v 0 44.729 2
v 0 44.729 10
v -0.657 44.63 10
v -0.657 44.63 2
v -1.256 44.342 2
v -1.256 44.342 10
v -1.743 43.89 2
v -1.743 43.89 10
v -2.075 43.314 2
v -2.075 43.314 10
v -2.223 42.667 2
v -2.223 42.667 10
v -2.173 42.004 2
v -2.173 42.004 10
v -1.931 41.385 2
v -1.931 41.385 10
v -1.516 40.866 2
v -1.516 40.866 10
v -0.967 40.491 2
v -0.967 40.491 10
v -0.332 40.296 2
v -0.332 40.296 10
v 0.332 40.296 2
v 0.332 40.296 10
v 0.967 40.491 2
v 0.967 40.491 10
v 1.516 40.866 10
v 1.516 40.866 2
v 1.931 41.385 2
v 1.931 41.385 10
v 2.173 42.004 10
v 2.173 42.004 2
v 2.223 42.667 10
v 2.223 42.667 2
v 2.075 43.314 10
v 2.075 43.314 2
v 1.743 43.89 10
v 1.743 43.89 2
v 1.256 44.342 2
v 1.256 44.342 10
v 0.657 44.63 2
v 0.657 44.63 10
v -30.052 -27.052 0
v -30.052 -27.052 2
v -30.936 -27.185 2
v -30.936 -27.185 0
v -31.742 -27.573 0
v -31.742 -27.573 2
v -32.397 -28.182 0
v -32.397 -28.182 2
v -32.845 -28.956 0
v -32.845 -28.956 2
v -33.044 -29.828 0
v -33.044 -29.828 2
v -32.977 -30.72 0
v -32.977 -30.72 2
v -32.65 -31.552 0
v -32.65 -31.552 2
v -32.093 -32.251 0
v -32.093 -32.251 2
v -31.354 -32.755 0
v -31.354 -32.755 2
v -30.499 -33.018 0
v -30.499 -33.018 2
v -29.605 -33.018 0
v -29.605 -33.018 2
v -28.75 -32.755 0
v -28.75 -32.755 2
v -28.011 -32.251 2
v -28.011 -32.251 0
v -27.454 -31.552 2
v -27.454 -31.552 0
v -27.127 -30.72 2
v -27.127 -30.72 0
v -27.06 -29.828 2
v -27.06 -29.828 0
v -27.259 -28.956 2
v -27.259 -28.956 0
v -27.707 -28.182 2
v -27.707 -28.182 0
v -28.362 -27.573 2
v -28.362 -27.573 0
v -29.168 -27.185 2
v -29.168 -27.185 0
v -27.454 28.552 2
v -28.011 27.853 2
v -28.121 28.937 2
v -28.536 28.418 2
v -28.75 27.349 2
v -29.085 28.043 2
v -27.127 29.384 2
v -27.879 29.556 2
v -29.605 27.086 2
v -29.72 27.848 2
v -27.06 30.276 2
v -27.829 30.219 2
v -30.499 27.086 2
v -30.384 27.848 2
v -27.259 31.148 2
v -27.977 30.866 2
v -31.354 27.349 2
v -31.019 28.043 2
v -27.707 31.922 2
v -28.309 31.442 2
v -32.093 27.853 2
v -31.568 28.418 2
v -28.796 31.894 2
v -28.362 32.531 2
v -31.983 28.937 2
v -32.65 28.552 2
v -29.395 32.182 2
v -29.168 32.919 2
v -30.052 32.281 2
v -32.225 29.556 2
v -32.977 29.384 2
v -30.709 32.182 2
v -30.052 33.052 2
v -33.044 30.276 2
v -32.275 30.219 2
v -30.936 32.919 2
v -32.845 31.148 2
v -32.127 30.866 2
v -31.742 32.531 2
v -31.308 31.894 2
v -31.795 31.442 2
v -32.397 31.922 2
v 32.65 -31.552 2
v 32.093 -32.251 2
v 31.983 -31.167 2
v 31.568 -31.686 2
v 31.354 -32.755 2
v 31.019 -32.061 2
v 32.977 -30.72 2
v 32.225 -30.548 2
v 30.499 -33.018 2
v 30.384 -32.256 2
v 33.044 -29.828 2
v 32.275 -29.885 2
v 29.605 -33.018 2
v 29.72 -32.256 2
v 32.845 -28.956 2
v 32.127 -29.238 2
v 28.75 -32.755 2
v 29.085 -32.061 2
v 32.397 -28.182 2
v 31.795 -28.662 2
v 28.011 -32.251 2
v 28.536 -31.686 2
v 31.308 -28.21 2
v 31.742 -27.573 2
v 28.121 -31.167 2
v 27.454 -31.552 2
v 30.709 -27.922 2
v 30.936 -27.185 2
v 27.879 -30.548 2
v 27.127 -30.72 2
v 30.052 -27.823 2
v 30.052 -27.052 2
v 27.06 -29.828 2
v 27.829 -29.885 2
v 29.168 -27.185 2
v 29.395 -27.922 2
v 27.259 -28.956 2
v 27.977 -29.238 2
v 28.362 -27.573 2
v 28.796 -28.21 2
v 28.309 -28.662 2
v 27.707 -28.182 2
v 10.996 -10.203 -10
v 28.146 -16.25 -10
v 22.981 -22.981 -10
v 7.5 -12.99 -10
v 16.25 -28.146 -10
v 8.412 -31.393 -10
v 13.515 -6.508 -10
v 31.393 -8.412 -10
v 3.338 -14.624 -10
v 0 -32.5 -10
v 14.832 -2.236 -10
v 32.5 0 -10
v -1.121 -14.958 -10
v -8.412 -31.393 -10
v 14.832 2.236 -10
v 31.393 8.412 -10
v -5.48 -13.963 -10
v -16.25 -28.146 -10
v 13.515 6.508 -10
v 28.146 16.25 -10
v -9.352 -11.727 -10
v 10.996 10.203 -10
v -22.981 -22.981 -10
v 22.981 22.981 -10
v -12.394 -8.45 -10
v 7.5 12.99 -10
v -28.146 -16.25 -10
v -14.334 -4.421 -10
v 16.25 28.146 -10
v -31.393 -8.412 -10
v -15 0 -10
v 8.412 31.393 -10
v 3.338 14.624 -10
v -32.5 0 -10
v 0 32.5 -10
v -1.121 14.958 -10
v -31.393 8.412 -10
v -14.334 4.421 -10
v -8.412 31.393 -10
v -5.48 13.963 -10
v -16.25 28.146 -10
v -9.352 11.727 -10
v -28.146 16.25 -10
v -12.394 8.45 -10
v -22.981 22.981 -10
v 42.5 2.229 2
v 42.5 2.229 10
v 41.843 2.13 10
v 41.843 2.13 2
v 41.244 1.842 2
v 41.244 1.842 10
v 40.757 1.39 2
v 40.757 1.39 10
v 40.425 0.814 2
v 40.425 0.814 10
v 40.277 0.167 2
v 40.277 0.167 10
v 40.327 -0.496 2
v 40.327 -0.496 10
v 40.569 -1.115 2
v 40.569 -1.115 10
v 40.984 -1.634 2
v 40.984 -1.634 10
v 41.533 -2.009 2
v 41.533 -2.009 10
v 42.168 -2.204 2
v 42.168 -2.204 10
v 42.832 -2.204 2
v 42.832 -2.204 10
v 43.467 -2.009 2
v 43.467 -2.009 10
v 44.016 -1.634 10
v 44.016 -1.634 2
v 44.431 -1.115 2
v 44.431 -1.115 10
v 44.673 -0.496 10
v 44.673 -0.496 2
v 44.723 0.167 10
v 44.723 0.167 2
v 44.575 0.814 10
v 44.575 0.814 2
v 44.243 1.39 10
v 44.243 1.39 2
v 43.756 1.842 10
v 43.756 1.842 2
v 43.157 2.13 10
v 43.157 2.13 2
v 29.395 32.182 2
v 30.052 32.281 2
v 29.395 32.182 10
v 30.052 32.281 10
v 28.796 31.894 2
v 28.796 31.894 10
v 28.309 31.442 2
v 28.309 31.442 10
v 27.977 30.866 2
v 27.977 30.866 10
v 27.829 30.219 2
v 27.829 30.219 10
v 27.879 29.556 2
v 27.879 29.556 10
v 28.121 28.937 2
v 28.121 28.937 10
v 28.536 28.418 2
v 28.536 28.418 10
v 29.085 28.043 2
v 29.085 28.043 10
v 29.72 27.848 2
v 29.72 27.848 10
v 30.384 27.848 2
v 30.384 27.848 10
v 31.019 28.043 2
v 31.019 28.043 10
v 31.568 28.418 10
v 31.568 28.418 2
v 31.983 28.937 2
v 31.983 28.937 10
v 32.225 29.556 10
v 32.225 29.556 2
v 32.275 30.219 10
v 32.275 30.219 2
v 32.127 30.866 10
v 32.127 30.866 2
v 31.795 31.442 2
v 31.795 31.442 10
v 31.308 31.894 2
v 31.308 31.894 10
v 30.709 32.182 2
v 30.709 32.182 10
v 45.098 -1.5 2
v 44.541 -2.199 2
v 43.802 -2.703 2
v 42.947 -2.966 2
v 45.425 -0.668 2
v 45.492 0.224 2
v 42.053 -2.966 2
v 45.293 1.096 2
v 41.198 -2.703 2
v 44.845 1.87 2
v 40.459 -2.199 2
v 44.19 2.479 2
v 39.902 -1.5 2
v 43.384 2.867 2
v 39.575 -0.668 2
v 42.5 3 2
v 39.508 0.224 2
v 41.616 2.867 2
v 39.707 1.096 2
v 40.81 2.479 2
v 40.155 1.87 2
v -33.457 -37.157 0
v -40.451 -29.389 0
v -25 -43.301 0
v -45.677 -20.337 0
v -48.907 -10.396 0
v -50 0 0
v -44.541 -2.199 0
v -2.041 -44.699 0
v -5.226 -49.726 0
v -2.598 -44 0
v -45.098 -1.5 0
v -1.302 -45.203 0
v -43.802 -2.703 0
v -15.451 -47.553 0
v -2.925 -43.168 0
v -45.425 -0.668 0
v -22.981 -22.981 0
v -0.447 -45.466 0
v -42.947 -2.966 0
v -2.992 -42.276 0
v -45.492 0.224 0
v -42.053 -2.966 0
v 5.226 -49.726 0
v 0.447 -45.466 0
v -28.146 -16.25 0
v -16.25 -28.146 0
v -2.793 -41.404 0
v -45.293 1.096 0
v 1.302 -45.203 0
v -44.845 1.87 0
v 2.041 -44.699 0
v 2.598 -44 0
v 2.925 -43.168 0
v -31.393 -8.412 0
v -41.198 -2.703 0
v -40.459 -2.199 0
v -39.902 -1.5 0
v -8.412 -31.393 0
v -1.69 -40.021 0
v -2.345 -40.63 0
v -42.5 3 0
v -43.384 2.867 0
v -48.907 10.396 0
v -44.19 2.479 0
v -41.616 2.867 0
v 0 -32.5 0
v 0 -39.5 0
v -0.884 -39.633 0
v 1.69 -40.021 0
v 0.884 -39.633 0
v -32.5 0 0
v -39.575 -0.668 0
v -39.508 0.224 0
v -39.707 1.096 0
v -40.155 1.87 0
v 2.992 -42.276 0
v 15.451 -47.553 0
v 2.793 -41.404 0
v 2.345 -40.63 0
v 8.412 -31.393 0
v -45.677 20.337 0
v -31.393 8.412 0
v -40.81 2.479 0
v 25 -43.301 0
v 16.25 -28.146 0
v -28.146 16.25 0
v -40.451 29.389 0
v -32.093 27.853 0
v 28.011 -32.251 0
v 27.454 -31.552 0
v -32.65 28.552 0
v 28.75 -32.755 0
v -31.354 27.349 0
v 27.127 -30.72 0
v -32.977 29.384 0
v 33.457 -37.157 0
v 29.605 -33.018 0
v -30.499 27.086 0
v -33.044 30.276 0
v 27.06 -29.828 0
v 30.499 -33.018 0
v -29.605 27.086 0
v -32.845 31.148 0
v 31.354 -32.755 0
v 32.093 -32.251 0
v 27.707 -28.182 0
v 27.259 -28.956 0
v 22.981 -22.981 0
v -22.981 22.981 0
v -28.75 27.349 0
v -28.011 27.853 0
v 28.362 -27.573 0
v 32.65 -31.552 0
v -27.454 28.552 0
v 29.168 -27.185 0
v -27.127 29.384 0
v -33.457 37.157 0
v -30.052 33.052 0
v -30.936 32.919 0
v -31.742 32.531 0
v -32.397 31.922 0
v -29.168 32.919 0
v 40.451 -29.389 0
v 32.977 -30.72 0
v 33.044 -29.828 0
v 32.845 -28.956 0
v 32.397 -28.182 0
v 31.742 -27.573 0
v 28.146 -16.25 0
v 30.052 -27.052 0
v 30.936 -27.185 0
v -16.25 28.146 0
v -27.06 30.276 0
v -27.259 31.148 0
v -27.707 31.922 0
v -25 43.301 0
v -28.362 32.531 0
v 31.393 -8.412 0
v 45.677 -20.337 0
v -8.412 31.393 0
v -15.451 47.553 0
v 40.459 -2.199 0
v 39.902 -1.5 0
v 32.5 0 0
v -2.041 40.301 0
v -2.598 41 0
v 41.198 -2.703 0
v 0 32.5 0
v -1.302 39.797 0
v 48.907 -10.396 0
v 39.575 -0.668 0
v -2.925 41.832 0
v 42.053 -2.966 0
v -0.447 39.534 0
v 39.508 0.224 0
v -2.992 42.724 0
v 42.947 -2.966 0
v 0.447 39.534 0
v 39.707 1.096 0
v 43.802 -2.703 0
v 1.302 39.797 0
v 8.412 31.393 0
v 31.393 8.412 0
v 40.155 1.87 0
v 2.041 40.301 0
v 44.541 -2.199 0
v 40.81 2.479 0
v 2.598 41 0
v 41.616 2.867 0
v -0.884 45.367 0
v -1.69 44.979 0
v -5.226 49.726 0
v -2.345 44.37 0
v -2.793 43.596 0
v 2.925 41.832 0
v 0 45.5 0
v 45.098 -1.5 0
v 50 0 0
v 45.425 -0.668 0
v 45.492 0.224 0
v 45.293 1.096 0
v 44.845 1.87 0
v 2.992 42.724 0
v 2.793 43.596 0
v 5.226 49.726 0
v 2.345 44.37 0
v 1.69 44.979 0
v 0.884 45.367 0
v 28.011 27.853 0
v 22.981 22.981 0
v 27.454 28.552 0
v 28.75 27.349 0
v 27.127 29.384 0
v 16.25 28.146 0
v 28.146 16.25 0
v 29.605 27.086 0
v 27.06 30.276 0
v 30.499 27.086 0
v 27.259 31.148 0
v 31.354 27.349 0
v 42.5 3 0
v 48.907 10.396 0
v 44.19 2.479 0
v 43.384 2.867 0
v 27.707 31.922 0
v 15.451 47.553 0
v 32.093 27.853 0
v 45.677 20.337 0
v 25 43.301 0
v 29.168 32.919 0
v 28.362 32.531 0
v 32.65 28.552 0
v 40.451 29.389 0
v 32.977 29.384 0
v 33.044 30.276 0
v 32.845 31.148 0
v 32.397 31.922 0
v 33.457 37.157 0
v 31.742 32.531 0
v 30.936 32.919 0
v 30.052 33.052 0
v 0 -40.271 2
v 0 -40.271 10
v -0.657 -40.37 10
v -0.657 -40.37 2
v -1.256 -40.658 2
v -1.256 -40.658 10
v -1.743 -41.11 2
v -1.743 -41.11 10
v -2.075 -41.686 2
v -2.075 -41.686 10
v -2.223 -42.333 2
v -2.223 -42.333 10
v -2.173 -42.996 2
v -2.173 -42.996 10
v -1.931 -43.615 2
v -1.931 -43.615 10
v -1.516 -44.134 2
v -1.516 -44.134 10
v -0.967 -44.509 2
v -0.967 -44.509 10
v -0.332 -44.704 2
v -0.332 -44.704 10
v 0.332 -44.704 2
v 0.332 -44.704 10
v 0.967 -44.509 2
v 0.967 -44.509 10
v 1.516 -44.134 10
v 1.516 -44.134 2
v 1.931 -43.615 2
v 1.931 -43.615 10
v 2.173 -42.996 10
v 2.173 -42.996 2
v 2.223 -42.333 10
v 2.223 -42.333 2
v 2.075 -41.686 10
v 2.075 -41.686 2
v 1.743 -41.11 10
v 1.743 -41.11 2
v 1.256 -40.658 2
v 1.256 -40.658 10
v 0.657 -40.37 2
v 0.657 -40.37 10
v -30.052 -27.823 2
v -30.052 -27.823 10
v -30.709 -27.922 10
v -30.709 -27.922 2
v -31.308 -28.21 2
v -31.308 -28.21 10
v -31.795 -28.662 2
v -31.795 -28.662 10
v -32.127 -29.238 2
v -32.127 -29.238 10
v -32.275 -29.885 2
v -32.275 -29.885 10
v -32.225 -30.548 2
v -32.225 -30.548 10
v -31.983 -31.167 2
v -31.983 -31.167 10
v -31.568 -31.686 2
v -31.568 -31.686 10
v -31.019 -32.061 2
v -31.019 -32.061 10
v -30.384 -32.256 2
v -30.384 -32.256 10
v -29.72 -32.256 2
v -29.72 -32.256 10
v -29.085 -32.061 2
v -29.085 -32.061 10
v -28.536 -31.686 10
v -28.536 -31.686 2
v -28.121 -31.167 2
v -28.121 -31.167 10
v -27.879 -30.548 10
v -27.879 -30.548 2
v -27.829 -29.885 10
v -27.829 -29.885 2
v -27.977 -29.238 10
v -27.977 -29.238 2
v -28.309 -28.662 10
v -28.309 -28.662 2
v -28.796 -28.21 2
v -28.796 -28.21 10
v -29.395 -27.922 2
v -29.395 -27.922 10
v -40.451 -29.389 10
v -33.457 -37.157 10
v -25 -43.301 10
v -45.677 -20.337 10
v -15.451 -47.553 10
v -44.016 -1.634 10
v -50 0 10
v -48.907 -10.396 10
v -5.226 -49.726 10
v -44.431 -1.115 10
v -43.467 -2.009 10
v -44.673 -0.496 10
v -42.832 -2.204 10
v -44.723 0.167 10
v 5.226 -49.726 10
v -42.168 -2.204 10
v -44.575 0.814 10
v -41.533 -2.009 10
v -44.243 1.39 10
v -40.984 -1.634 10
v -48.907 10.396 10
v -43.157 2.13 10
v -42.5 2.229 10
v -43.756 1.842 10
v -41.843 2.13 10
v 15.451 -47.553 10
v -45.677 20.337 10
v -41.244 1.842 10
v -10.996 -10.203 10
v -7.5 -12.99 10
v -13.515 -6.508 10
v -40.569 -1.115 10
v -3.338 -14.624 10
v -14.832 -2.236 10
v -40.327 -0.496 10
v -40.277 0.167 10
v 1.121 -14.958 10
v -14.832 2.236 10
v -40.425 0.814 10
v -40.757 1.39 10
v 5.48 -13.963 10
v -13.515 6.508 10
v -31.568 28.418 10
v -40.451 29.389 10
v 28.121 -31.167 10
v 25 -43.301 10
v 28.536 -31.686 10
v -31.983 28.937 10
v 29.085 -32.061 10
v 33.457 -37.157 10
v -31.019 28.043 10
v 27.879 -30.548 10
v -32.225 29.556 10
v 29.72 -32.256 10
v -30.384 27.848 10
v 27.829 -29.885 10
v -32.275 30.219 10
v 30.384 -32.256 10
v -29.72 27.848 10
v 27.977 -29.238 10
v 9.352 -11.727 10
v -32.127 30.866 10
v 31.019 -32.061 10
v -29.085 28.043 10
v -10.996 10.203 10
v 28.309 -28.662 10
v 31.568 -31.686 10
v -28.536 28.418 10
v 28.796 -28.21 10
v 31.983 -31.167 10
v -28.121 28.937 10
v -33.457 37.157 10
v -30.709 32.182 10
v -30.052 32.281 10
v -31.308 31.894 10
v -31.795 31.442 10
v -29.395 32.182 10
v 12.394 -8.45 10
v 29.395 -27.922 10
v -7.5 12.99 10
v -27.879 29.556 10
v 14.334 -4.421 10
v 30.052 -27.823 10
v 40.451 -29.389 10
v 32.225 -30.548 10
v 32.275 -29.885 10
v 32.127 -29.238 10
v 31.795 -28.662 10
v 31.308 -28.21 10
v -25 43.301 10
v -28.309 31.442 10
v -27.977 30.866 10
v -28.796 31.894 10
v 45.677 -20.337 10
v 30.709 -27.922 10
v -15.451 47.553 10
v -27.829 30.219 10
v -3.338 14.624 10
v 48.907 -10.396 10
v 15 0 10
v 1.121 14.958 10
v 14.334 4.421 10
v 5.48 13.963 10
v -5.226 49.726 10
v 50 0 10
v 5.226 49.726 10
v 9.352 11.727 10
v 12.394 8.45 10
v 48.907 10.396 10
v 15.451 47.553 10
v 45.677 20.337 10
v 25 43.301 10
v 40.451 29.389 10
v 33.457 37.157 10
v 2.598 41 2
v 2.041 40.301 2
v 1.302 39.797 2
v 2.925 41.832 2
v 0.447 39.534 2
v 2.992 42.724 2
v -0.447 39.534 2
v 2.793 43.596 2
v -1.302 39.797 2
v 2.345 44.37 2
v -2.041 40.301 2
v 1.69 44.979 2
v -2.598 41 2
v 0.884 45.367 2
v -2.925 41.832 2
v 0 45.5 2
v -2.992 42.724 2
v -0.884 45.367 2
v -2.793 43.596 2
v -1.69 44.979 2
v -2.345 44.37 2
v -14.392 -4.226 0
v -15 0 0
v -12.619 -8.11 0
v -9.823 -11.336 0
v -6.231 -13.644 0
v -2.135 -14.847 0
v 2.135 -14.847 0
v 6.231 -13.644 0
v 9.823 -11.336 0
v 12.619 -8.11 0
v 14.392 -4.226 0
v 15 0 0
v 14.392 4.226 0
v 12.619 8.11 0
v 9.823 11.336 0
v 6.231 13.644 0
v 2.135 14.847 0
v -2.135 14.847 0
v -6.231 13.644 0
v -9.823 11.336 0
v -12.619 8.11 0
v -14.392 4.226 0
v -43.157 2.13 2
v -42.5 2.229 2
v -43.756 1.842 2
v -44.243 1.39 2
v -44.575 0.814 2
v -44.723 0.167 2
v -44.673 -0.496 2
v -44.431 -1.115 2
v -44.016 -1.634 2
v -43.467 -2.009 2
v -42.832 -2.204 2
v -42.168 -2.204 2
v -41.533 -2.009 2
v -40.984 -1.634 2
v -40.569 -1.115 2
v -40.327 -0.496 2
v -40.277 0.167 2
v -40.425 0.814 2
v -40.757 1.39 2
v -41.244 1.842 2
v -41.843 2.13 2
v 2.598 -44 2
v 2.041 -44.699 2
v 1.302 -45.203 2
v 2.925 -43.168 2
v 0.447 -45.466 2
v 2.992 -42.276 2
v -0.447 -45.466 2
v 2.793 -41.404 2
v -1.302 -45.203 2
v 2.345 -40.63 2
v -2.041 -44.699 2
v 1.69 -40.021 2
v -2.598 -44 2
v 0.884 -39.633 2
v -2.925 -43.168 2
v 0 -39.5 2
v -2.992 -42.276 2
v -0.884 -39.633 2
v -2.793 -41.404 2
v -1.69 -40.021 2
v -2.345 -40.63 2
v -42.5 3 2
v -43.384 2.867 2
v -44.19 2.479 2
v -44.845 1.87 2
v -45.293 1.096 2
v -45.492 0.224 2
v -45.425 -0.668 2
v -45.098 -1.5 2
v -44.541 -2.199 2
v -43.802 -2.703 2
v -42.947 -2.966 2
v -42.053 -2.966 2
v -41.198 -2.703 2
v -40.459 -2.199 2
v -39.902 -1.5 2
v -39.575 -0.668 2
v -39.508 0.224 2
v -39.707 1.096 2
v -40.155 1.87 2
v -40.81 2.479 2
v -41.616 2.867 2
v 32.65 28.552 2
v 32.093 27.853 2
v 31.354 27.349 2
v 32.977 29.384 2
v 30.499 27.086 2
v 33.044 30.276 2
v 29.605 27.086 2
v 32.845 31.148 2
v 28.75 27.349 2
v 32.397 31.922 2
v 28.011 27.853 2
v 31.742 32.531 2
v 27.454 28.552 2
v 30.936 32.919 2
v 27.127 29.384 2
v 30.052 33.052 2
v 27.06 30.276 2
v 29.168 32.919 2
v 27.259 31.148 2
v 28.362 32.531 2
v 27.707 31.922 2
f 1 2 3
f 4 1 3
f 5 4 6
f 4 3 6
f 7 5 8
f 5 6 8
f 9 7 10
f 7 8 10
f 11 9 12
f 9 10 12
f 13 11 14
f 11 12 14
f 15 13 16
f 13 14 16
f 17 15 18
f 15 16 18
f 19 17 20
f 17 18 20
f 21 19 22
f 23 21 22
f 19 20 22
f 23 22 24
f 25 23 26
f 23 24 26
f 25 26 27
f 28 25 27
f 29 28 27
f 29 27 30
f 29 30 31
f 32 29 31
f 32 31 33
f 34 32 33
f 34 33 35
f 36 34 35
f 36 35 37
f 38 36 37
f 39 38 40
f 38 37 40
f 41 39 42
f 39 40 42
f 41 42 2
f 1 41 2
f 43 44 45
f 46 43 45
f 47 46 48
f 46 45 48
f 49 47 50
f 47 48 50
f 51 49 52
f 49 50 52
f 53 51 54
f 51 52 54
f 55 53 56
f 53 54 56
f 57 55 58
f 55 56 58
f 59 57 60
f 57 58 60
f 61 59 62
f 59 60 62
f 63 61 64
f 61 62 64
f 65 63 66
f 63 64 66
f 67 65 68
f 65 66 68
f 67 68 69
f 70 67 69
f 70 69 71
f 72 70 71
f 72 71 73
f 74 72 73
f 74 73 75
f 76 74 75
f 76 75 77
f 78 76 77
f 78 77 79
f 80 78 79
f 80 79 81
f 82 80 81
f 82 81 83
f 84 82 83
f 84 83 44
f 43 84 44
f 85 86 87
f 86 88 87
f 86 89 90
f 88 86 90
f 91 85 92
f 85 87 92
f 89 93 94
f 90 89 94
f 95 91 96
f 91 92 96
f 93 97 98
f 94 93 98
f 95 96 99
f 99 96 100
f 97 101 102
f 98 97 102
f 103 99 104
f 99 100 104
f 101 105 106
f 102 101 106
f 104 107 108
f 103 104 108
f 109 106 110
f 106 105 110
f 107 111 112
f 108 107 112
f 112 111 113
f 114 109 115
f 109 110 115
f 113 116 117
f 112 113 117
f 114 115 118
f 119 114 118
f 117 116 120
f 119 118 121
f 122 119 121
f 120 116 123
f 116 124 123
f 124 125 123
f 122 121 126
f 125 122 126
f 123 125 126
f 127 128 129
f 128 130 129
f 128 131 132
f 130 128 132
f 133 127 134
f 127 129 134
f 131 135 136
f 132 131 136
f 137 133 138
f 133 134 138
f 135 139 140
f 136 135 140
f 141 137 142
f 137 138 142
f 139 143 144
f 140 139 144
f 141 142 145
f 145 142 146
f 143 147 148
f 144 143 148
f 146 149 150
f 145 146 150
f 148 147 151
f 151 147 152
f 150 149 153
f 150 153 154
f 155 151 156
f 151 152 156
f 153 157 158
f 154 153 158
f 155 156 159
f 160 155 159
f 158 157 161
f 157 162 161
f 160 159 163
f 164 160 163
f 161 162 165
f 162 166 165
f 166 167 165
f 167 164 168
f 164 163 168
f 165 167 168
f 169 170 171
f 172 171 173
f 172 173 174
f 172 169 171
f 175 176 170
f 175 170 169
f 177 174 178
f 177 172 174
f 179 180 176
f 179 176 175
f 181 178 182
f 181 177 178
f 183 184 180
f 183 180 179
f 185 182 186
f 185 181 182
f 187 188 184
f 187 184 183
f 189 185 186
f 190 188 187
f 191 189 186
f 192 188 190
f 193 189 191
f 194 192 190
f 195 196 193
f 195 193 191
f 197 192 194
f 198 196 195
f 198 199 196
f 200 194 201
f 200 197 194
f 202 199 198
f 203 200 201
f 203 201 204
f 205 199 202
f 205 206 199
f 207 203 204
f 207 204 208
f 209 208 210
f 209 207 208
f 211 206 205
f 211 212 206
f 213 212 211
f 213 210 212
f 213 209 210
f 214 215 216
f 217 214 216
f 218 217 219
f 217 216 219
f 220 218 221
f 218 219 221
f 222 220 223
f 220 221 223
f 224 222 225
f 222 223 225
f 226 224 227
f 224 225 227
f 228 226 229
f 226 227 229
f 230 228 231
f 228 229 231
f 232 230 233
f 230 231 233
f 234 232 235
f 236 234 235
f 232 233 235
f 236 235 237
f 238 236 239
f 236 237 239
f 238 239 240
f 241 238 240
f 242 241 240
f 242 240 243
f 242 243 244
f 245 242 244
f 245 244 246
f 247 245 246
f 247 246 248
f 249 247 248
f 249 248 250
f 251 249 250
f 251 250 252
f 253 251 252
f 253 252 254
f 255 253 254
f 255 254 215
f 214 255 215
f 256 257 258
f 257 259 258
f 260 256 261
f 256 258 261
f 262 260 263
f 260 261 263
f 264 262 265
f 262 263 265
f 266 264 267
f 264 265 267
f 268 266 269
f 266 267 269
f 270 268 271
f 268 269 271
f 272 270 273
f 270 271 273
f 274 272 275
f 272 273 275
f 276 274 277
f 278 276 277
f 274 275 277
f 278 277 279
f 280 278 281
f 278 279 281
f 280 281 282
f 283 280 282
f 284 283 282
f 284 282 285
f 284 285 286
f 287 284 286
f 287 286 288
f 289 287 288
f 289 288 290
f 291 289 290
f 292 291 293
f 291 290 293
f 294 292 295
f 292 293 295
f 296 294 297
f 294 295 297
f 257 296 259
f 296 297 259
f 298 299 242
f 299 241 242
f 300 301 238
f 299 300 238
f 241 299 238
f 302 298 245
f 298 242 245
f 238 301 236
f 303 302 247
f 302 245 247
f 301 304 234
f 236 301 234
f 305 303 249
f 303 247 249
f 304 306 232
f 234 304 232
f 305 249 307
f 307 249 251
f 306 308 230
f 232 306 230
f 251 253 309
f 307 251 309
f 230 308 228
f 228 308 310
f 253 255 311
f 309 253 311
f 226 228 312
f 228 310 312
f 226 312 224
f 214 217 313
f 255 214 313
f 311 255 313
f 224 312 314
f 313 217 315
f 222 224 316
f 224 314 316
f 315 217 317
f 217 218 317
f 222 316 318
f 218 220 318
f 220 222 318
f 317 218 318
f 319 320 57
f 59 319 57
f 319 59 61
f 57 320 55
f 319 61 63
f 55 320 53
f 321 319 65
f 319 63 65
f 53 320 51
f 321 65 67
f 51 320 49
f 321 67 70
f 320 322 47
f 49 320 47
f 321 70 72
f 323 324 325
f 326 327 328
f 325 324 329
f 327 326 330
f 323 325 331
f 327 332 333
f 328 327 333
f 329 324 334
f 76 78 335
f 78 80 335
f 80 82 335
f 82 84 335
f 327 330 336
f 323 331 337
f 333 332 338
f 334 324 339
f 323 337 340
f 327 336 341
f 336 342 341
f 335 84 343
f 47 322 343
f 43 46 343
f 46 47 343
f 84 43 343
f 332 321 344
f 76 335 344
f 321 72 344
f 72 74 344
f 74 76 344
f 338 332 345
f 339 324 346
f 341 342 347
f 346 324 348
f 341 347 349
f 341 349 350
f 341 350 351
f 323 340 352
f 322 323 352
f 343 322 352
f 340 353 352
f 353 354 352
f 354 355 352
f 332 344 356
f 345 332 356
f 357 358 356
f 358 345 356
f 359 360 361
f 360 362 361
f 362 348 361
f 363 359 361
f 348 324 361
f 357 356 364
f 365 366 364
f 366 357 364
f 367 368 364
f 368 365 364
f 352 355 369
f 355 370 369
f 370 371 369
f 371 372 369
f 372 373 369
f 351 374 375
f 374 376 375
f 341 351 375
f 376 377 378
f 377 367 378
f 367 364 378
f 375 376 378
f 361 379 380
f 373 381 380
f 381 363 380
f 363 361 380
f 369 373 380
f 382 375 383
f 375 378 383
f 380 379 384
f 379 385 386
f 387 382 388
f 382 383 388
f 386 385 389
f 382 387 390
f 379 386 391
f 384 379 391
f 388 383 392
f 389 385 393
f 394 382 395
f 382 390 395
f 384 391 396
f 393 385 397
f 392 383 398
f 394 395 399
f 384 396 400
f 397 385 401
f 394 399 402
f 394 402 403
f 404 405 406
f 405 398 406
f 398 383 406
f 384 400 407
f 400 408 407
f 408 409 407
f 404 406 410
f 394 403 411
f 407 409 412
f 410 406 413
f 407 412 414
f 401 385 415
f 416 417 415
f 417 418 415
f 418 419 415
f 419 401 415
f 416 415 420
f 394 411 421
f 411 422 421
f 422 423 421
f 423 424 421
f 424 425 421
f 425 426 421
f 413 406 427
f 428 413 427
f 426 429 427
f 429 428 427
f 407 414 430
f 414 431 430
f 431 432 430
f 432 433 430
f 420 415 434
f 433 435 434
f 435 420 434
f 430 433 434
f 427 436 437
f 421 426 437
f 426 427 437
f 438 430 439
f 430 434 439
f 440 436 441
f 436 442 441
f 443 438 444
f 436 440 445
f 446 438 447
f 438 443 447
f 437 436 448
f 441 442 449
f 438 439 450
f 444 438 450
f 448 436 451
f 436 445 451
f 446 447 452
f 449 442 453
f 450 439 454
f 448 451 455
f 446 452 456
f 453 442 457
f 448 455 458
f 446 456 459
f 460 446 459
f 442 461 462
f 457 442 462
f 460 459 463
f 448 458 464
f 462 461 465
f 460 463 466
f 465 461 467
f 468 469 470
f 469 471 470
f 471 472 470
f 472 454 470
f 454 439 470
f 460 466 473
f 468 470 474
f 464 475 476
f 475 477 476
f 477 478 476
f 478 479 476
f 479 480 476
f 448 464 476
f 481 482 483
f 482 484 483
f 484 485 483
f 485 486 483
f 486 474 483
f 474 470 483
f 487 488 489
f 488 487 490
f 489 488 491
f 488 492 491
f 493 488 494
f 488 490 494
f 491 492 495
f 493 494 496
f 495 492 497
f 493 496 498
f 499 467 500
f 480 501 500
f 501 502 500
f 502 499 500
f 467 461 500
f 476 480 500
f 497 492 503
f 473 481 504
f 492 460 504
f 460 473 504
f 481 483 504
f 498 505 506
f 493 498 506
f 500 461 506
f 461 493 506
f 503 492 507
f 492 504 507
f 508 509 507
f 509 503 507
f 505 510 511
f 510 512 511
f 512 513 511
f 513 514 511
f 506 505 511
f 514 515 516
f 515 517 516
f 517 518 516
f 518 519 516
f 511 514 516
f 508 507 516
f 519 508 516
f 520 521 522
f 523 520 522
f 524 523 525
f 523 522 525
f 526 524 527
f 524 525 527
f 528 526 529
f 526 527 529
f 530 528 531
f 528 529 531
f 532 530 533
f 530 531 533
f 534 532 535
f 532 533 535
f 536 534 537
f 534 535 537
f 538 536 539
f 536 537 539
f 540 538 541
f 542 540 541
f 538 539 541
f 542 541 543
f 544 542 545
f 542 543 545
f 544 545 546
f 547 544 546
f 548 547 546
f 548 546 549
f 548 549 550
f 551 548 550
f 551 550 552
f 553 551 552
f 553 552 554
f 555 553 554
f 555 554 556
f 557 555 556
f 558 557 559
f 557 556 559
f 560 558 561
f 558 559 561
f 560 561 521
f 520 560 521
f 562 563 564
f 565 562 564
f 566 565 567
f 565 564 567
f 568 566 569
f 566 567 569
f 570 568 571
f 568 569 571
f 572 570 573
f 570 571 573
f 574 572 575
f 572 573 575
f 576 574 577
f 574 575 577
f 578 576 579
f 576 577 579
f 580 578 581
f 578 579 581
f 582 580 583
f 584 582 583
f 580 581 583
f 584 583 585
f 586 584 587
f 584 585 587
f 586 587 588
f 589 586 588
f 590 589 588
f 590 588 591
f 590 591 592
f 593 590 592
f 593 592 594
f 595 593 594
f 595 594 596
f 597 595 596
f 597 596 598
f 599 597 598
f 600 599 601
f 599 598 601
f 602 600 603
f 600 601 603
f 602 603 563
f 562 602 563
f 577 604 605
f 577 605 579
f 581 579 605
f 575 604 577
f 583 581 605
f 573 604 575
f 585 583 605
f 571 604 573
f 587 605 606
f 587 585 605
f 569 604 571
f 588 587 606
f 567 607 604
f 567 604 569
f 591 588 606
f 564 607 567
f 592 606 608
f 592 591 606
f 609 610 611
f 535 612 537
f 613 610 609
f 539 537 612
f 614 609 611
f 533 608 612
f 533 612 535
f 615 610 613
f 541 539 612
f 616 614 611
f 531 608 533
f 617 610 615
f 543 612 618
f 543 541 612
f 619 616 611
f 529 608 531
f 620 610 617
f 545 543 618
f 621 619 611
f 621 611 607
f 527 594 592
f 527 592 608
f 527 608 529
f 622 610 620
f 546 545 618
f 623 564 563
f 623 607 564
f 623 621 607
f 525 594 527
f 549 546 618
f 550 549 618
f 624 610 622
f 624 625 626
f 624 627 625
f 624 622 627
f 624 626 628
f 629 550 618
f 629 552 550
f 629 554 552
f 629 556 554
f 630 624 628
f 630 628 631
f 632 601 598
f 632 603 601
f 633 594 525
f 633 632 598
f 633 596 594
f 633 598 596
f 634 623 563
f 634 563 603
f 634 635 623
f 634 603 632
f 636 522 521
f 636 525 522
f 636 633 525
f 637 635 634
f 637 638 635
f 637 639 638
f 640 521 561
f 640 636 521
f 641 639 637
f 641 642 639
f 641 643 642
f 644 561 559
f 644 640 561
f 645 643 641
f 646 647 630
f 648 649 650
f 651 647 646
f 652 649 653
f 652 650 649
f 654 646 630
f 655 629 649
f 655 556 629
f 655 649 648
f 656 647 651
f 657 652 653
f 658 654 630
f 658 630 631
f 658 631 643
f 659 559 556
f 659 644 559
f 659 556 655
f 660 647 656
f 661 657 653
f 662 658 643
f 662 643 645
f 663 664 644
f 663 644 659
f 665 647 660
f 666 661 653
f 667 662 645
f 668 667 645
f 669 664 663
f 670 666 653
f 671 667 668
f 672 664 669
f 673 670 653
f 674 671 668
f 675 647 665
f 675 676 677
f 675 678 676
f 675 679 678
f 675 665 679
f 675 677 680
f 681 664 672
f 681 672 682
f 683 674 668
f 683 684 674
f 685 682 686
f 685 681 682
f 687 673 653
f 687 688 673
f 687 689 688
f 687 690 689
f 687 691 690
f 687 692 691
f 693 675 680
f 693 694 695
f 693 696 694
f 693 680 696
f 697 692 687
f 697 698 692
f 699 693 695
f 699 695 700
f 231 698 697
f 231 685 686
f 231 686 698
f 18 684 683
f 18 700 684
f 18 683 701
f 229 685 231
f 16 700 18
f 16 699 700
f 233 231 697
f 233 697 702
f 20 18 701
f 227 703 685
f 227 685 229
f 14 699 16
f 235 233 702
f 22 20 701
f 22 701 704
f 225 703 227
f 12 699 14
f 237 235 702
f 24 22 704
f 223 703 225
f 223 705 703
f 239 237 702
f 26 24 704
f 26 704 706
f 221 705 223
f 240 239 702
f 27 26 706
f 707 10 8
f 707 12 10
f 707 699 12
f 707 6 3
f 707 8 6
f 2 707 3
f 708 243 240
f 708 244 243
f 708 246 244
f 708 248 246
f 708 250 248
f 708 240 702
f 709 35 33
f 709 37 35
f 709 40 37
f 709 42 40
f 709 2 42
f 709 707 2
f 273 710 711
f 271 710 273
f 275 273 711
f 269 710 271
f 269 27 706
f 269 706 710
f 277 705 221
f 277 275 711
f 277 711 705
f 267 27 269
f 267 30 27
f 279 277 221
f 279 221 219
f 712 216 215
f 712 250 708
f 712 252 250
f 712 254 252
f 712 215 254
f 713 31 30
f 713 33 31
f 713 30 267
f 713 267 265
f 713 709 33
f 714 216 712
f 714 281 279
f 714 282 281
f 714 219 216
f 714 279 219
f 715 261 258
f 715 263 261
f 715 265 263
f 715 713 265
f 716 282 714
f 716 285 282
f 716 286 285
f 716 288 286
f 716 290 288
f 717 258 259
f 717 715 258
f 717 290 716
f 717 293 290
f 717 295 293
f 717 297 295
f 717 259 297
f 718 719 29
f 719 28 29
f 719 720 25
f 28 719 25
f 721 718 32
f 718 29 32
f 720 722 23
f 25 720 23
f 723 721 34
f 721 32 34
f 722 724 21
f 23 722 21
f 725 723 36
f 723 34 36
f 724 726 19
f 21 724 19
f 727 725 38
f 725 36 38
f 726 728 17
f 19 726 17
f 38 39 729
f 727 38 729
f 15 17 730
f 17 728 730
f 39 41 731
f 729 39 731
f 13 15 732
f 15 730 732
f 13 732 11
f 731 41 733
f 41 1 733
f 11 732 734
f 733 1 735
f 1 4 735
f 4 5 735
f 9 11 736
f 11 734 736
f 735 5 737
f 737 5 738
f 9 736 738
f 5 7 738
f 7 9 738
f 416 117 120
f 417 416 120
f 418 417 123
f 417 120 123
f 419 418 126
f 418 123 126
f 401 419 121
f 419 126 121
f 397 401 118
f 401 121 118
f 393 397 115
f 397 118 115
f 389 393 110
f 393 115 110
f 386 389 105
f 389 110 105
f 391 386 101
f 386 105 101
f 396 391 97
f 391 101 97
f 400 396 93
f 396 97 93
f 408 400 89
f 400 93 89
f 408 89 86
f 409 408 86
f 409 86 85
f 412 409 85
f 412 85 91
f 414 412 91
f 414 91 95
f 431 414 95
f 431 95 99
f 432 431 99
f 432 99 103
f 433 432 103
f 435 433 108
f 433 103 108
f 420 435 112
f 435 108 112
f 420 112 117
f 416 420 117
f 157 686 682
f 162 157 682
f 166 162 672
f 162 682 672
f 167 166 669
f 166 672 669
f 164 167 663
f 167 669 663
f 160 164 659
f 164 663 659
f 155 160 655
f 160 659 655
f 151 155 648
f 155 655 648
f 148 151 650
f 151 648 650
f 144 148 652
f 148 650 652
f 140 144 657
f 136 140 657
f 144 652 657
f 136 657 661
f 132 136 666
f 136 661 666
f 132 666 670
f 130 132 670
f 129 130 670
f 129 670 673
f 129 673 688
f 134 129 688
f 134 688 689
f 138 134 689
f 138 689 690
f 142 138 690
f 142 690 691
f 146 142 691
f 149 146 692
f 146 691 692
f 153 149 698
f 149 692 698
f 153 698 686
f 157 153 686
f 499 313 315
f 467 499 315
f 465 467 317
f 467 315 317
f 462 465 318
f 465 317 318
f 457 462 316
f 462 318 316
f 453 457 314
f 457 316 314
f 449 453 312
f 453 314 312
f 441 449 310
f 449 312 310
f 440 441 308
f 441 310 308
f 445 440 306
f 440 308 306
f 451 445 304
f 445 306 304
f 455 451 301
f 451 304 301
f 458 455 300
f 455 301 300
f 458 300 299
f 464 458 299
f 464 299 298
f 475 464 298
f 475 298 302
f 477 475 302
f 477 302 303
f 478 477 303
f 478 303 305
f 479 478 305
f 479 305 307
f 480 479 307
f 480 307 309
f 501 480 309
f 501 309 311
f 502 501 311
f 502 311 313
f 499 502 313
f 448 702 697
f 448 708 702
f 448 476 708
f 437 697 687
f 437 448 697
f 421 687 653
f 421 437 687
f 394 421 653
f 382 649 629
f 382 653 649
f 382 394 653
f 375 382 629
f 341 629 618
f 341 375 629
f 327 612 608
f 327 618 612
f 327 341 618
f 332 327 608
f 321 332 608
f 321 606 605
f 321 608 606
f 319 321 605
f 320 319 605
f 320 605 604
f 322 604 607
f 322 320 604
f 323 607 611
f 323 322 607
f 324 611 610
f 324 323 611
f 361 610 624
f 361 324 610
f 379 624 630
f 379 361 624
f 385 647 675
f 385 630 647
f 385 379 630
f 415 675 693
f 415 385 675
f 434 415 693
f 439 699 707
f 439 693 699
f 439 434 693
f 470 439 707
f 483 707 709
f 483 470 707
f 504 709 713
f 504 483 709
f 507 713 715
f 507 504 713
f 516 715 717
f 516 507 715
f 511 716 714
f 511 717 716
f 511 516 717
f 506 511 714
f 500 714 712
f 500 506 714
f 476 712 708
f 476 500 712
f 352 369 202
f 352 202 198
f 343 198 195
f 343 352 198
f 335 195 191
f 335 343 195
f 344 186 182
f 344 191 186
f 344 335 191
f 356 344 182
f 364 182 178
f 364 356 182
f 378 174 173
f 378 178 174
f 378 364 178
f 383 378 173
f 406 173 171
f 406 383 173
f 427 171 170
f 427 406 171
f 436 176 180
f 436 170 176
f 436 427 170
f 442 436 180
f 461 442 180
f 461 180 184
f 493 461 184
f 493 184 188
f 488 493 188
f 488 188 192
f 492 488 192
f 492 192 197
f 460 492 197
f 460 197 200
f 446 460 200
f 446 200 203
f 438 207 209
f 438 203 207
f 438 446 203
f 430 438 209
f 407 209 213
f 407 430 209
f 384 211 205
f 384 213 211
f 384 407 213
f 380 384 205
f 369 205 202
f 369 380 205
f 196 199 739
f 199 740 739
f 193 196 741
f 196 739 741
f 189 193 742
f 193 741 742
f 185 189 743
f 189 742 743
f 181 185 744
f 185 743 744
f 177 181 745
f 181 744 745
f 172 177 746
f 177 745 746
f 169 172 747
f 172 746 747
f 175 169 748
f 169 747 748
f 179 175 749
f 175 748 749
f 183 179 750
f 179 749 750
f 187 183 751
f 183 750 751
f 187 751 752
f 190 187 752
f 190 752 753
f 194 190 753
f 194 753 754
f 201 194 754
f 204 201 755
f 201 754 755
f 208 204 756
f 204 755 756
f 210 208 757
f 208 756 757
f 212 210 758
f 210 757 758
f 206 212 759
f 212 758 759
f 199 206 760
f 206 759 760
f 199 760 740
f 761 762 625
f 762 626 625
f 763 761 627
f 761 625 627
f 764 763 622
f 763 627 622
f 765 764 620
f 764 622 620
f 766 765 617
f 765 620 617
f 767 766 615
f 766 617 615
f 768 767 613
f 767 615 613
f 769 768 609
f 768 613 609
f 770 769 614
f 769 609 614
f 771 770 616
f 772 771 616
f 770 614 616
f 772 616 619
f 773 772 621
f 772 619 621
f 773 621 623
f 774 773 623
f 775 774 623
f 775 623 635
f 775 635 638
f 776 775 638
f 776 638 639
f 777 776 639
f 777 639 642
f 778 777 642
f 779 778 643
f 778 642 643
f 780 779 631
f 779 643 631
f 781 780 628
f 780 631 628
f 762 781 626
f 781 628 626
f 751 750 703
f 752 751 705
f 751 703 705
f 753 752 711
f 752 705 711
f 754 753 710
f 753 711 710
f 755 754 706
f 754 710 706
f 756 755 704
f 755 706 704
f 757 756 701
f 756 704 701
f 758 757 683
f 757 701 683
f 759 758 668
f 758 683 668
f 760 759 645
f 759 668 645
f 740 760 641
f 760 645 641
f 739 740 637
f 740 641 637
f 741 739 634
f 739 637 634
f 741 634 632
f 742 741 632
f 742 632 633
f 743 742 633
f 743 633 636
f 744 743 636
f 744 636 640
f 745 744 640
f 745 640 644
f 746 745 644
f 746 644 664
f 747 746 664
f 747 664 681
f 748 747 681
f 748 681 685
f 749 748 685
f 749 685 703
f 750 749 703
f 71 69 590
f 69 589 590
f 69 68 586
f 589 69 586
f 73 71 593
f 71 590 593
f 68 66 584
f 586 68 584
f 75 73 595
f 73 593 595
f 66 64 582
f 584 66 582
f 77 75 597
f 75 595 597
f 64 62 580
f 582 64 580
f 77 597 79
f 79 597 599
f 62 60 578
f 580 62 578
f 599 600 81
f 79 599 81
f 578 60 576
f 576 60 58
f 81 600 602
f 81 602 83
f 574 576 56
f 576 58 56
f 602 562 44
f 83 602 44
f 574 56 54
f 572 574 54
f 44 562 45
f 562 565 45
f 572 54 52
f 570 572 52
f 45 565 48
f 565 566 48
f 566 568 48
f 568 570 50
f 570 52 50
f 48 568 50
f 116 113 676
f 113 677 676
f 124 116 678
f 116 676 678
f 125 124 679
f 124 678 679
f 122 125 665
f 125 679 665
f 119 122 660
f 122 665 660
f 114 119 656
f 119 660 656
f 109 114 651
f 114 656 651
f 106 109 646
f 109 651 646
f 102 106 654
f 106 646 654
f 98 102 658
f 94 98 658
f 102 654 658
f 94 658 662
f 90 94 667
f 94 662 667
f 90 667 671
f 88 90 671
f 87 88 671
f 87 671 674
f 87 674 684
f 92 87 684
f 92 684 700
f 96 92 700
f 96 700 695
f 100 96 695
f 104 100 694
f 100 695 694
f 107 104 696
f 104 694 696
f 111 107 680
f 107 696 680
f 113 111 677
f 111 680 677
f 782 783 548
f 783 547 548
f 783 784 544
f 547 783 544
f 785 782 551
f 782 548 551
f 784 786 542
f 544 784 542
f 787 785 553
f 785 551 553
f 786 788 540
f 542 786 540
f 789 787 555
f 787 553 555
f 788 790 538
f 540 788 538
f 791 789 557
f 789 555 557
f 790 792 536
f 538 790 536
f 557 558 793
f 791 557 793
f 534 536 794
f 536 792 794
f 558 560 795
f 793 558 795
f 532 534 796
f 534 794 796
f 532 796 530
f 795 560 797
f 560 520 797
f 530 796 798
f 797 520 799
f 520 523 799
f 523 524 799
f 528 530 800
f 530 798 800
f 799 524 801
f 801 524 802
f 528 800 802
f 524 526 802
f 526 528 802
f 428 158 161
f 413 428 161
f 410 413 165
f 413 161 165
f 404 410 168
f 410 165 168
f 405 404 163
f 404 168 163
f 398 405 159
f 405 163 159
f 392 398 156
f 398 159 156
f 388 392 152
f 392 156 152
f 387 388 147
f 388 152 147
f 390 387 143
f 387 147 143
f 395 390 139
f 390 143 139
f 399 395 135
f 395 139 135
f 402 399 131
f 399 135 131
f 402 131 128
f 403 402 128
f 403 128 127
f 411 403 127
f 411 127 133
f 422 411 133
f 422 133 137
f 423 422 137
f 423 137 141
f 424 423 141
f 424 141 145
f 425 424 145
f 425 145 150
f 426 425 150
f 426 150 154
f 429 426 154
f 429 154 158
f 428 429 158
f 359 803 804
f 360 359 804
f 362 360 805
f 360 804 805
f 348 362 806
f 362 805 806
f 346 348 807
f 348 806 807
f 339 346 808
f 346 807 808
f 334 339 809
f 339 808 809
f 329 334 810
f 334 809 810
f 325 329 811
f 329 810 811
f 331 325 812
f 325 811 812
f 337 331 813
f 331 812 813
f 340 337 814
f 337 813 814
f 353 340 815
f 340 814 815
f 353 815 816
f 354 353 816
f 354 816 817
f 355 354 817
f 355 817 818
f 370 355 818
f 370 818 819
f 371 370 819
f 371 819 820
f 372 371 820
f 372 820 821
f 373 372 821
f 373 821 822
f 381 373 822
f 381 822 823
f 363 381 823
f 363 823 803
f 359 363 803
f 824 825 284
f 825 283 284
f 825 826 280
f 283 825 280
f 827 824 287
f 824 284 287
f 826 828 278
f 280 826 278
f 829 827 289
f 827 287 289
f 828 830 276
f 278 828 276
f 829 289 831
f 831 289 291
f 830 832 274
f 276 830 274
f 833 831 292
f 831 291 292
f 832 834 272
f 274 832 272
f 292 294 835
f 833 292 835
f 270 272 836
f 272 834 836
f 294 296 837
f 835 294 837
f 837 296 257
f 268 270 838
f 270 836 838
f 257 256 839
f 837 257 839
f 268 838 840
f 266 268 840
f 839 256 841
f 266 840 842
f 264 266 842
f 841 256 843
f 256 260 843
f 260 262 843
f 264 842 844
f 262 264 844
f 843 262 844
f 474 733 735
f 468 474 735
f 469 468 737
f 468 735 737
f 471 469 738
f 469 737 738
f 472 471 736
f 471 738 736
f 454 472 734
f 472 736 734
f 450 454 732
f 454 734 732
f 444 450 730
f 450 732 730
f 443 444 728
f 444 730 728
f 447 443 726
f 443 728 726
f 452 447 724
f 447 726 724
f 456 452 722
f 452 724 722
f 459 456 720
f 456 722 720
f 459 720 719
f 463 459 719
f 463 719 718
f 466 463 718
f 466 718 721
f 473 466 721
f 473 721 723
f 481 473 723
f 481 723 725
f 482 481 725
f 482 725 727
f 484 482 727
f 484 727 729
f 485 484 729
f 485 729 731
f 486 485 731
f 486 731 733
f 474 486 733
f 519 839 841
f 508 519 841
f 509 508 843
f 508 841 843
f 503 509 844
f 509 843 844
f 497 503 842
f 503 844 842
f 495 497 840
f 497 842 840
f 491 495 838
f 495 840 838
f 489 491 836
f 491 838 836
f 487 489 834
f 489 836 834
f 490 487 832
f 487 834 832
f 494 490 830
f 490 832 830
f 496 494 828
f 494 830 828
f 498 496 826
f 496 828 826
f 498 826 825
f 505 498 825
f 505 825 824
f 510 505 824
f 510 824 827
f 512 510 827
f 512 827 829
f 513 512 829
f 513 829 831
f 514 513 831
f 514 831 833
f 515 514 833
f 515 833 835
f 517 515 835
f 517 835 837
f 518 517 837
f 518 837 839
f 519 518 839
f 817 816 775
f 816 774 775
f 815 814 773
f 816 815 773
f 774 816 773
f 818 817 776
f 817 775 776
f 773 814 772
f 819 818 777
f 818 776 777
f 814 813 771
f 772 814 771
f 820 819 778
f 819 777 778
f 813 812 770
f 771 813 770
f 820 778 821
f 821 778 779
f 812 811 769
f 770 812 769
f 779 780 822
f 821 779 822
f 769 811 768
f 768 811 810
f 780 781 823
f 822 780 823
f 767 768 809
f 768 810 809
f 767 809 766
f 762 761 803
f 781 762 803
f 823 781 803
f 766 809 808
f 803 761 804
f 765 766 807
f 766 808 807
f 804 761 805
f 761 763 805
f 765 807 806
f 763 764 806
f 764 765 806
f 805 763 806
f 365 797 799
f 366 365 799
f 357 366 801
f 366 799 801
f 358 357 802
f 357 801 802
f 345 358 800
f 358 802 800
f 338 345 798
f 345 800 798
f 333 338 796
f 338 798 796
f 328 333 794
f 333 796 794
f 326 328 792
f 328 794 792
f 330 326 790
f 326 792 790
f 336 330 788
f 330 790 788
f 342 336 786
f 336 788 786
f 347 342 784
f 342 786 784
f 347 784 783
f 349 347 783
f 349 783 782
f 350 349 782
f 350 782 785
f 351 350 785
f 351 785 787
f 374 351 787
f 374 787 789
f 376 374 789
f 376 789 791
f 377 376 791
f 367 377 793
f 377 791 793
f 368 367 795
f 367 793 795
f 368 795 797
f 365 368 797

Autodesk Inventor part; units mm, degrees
ref_plane "YZ Plane" through (0, 0, 0) normal (1, 0, 0) x (0, 1, 0)
ref_plane "XZ Plane" through (0, 0, 0) normal (0, 1, 0) x (-1, 0, 0)
ref_plane "XY Plane" through (0, 0, 0) normal (0, 0, 1) x (1, 0, 0)
sketch "Sketch1" plane through (0, 0, 0) normal (0, 0, 1) x (1, 0, 0)
  circle A0 centre (0, 0) radius 50
  circle A1 centre (0, 0) radius 47.5
  circle A2 centre (0, 0) radius 42.5
  circle A3 centre (0, 0) radius 42.5
  circle A4 centre (0, 0) radius 42.5
  circle A5 centre (0, 0) radius 42.5
  circle A6 centre (0, 0) radius 42.5
  circle A7 centre (0, 0) radius 42.5
  circle A8 centre (0, 0) radius 42.5
  circle A9 centre (0, 0) radius 42.5
  point P0 (-42.5, 0)
  point P1 (-30.052, 30.052)
  point P2 (0, 42.5)
  point P3 (30.052, 30.052)
  point P4 (42.5, 0)
  point P5 (30.052, -30.052)
  point P6 (0, -42.5)
  point P7 (-30.052, -30.052)
  dimension "d4" = 85
  dimension "d0" = 100
  dimension "d3" = 95
  dimension "d5" = 360
extrude "Extrusion1" add sketch "Sketch1" along normal blind 10 contours A0 | A1 | A2
hole "Hole1" at (-42.5, 0, 0) at (-30.052, 30.052, 0) at (0, 42.5, 0) at (30.052, 30.052, 0) at (42.5, 0, 0) at (30.052, -30.052, 0) at (0, -42.5, 0) at (-30.052, -30.052, 0) direction (0, 0, 1) diameter 4.4587 depth 10 tip angle 118 counterbore diameter 6 counterbore depth 2 thread size "M5x0.5" class "6H" standard "ISO Metric profile"
sketch "Sketch2" plane through (0, 0, 10) normal (0, 0, 1) x (1, 0, 0)
  circle A0 centre (0, 0) radius 21
  circle A1 centre (0, 0) radius 15
  dimension "d15" = 42
  dimension "d16" = 30
ref_plane "Work Plane1" through (0, 0, 10) normal (0, 0, 1) x (1, 0, 0)
sketch "Sketch4" plane through (0, 0, 10) normal (0, 0, 1) x (1, 0, 0)
  circle A0 centre (0, 0) radius 15 projected
extrude "Extrusion4" cut sketch "Sketch4" against normal through all
sketch "Sketch5" plane through (0, 0, 0) normal (0, 0, -1) x (-1, 0, 0)
  circle A0 centre (0, 0) radius 32.5
  circle A1 centre (0, 0) radius 15 projected
  point P0 (0, 25)
  dimension "d23" = 25
  dimension "d24" = 65
extrude "Extrusion5" add sketch "Sketch5" along normal blind 10
properties part number "Cover of gearbox"
